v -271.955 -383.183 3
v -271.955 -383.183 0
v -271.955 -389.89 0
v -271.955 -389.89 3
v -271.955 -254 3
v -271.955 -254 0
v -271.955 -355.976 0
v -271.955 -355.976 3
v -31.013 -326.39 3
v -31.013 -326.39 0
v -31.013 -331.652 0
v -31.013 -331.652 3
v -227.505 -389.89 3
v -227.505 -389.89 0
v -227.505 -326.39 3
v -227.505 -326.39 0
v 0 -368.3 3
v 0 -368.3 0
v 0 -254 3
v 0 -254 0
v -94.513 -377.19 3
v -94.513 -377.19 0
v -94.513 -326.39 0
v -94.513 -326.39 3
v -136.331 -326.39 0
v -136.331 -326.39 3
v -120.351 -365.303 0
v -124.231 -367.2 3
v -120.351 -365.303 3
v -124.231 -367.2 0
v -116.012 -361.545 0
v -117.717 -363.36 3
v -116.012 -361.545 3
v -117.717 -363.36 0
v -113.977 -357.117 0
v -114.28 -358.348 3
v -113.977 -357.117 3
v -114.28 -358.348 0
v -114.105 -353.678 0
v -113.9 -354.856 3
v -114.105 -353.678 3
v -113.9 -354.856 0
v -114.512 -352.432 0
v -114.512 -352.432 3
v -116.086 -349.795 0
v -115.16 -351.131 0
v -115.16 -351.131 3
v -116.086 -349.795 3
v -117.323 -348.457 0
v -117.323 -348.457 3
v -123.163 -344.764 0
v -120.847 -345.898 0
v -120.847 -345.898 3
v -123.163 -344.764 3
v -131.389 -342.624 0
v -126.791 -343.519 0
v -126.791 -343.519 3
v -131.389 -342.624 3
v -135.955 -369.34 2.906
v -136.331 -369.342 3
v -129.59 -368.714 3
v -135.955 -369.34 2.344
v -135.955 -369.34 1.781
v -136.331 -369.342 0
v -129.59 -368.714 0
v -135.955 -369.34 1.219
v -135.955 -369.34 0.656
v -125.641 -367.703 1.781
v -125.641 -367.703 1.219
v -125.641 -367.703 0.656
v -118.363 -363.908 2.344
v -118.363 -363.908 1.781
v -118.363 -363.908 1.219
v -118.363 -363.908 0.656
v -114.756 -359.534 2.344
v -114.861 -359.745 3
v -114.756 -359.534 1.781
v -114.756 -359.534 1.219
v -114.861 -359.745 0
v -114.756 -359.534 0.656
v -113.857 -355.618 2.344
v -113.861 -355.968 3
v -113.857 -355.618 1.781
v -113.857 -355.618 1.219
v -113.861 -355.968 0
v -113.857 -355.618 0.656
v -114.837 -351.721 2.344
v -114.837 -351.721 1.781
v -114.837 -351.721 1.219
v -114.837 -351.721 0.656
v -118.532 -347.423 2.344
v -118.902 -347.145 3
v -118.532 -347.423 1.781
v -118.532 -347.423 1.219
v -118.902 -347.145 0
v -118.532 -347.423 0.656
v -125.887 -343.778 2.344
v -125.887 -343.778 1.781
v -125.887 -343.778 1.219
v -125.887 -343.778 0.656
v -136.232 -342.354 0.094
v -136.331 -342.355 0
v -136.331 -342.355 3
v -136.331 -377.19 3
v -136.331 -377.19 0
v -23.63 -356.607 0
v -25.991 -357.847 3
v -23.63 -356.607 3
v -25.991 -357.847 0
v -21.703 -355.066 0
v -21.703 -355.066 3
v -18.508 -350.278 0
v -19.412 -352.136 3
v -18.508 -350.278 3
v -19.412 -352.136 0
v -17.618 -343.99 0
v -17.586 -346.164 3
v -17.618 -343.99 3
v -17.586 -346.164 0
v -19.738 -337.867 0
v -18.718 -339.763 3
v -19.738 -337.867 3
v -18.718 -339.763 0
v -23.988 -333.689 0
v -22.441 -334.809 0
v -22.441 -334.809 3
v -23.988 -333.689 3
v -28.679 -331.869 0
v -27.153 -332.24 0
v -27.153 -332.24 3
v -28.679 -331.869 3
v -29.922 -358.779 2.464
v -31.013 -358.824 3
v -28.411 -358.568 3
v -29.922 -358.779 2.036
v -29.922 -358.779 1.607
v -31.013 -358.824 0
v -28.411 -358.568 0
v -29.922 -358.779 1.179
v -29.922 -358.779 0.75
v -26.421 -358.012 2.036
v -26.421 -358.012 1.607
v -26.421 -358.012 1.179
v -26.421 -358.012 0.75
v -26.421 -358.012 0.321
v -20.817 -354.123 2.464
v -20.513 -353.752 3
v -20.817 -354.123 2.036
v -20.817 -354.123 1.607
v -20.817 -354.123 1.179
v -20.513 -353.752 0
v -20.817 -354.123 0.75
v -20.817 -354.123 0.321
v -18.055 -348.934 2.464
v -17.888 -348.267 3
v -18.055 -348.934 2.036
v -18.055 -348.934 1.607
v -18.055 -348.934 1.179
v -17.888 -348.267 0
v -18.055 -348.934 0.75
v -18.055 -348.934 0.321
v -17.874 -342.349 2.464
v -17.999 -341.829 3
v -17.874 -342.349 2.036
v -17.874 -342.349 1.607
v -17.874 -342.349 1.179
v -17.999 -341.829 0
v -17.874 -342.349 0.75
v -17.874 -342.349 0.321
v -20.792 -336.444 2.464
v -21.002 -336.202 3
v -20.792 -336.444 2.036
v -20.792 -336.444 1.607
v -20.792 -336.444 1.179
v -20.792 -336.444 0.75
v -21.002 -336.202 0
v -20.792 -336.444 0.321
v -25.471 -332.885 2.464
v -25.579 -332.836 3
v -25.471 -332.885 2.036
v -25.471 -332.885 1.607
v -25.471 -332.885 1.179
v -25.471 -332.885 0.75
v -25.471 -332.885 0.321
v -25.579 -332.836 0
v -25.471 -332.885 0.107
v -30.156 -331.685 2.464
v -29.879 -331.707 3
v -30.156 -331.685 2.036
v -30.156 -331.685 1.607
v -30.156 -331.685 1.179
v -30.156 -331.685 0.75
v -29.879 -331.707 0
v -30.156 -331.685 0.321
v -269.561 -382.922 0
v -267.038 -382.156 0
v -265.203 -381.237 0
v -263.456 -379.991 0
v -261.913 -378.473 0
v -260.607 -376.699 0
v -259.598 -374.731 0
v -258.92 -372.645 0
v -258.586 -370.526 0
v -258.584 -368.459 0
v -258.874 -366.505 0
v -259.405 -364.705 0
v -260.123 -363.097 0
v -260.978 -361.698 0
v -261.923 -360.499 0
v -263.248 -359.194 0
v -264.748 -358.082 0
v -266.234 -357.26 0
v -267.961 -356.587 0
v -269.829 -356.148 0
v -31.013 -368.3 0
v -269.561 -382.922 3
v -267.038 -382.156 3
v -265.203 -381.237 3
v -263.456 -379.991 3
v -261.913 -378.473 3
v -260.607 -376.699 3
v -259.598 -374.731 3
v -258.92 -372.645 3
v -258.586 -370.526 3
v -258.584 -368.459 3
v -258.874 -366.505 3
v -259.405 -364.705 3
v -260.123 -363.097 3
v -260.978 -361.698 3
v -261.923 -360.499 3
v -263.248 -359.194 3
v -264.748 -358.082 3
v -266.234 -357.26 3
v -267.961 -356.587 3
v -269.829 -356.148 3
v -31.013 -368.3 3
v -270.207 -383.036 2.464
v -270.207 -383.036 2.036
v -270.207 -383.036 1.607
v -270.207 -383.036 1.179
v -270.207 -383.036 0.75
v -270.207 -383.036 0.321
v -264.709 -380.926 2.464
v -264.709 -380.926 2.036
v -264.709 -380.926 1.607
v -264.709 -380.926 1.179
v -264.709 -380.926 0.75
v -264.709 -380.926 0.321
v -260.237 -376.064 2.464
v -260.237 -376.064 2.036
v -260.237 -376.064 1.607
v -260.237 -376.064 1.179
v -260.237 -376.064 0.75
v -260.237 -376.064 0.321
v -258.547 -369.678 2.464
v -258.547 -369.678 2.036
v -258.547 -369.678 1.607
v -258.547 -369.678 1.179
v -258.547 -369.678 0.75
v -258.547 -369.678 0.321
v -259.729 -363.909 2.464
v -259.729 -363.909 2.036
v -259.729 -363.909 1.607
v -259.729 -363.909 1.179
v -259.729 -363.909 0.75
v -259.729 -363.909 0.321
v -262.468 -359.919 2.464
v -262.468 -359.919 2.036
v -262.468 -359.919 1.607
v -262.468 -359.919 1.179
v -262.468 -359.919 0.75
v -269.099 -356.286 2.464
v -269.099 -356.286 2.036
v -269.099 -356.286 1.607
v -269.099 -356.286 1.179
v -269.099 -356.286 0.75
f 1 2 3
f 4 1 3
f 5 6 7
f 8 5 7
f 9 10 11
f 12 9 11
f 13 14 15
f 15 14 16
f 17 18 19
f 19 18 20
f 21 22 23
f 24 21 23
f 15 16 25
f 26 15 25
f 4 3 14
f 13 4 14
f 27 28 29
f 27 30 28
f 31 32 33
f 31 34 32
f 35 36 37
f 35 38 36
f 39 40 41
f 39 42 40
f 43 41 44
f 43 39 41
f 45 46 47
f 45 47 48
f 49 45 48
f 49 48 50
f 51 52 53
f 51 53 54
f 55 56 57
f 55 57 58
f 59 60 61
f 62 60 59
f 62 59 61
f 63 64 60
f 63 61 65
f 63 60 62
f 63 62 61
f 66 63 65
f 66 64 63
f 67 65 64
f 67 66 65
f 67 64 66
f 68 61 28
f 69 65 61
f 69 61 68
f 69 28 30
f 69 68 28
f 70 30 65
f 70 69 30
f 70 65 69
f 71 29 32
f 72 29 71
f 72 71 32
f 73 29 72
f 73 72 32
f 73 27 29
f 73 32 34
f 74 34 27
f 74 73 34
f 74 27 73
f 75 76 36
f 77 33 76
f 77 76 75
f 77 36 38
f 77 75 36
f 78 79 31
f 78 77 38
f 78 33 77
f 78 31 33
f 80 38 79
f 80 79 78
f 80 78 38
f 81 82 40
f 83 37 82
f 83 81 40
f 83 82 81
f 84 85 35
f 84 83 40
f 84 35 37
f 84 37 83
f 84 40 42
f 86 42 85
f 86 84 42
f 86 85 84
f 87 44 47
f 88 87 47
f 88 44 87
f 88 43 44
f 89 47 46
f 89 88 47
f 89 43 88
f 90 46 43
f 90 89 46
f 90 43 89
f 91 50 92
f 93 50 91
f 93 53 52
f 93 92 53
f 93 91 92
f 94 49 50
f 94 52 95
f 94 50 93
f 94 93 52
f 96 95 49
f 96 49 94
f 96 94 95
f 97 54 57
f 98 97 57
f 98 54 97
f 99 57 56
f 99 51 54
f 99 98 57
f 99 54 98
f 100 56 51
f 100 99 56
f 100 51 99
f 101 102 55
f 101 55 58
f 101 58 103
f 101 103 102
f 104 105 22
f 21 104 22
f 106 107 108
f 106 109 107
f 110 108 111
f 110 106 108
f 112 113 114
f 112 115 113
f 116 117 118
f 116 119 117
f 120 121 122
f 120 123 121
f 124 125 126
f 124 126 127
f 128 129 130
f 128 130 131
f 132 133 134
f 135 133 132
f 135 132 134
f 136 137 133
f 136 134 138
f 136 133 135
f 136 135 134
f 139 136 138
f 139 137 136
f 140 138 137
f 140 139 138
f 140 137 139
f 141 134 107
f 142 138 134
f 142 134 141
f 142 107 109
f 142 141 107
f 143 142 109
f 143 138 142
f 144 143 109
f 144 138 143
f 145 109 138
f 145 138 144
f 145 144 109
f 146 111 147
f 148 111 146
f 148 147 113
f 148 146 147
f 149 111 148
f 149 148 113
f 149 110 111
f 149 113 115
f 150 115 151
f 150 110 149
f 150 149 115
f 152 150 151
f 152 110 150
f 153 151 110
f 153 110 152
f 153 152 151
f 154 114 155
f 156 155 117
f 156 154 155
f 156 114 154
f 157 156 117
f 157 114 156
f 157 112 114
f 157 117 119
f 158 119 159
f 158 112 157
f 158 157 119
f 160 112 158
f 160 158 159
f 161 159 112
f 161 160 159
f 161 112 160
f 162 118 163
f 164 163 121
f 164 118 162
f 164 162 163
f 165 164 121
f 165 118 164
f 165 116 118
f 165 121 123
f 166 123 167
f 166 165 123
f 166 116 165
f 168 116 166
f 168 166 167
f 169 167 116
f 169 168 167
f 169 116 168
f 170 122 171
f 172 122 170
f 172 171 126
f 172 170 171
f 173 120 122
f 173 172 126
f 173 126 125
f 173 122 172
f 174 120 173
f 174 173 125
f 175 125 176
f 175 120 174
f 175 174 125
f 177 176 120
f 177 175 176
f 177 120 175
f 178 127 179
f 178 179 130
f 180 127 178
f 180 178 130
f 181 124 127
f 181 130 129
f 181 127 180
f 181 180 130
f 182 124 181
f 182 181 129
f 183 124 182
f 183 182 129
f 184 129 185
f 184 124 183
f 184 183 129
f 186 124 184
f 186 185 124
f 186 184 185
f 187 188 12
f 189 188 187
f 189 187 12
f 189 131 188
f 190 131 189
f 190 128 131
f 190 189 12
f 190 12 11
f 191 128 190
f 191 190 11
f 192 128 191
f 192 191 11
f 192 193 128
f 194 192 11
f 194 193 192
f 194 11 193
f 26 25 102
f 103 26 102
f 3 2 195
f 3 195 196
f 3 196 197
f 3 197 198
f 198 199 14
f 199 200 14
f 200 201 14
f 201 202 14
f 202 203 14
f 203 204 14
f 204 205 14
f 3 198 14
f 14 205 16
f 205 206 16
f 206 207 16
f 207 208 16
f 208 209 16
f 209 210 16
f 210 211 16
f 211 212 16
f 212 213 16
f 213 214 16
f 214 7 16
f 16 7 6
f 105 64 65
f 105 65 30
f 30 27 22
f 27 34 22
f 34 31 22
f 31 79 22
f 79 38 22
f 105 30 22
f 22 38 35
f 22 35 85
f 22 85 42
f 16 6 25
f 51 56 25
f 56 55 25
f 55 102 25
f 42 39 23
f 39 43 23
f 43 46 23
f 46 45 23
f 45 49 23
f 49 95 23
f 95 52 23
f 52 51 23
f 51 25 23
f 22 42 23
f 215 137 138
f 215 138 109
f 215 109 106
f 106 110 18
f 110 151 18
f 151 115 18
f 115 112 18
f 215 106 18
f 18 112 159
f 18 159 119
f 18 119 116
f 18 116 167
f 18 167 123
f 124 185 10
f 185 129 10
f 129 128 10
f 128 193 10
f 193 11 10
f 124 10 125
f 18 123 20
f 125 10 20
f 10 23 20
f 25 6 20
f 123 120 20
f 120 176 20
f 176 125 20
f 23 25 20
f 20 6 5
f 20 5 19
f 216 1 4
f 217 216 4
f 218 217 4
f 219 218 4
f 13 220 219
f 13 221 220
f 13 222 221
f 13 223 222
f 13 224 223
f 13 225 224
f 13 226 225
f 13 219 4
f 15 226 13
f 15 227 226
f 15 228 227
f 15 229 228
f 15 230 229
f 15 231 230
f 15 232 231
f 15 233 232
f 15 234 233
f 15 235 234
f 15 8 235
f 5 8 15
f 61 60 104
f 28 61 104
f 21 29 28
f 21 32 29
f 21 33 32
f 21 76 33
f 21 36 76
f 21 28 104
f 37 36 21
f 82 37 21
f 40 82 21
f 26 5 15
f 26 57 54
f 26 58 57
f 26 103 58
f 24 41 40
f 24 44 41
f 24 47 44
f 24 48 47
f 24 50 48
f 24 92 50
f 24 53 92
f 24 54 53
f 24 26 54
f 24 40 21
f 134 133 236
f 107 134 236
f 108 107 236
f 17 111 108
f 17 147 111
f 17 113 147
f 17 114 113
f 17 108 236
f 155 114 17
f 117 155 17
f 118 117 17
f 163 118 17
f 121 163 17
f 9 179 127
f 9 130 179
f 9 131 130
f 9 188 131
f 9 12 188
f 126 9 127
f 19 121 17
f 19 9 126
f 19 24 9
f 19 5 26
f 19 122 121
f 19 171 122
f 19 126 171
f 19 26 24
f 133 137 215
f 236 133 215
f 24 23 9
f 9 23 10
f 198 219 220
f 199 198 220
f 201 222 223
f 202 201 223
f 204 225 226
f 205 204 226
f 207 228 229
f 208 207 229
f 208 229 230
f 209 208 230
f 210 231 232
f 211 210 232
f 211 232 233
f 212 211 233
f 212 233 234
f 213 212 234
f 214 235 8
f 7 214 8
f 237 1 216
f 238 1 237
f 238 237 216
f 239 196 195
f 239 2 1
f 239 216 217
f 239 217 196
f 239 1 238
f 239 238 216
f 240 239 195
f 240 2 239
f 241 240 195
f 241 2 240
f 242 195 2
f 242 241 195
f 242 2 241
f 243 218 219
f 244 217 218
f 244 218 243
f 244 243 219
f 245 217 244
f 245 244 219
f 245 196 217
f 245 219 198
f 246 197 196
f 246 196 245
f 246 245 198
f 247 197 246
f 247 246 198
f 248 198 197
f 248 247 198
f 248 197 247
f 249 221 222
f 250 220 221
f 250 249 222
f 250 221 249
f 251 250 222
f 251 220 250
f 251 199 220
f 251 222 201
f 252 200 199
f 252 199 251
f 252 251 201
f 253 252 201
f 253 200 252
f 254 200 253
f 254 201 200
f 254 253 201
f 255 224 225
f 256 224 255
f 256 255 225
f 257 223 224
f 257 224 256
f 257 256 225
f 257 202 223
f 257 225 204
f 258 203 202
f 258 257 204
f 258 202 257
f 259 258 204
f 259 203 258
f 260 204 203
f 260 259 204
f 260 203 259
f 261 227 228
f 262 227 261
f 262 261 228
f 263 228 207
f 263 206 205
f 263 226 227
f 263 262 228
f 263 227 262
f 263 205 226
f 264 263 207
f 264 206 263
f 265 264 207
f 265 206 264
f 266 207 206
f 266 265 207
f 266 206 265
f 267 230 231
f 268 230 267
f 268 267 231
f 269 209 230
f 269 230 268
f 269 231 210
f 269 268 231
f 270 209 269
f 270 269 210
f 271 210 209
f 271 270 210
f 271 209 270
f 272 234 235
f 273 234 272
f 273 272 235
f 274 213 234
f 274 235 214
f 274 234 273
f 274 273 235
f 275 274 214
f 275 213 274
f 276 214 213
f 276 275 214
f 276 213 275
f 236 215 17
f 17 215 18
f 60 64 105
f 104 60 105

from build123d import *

# Parameters (mm, degrees)
BOSS_EXTRUDE3_OUTLINE_W = 330.2
BOSS_EXTRUDE3_OUTLINE_H = 190.5
BOSS_EXTRUDE3_DEPTH     = 3
CUT_EXTRUDE2_DEPTH      = 554.733952504


# Read off the part's stored shape, not the designer's step: Boss-Extrude3
with BuildPart() as part:
    # Boss-Extrude3 outline → Boss-Extrude3 (new body)
    with BuildSketch(Plane.XY):
        with Locations((-165.1, -349.25)):
            Rectangle(BOSS_EXTRUDE3_OUTLINE_W, BOSS_EXTRUDE3_OUTLINE_H)
        with BuildLine():
            add(Edge.make_bspline(
                [(-278.621518652, -381.53819229), (-278.370340025, -381.675788485), (-277.859461829, -381.935426093), (-276.719402462, -382.422402226), (-274.453837446, -383.121197535), (-270.353871795, -383.430649395), (-265.517981506, -381.766237097), (-262.122707267, -378.912933368), (-260.111865445, -376.132298445), (-258.851133292, -372.940751822), (-258.274482706, -368.543399957), (-259.475297643, -363.572067472), (-261.943328375, -360.2835567), (-263.751900196, -358.750531033), (-264.776043253, -358.051952395), (-265.516797717, -357.615831636), (-266.283115012, -357.226375224), (-267.423174378, -356.739399091), (-269.688739395, -356.040603782), (-273.788705045, -355.731151923), (-278.624595335, -357.395564221), (-282.019869573, -360.248867949), (-284.030711396, -363.029502872), (-285.291443548, -366.221049495), (-285.868094135, -370.61840136), (-284.667279197, -375.589733845), (-282.199248466, -378.878244617), (-280.390676644, -380.411270284), (-279.366533588, -381.109848922), (-278.872697278, -381.400596095), (-278.621518652, -381.53819229)],
                knots=[0, 0, 0, 0, 0.015625, 0.03125, 0.0625, 0.125, 0.1875, 0.21875, 0.25, 0.28125, 0.3125, 0.375, 0.4375, 0.46875, 0.484375, 0.5, 0.515625, 0.53125, 0.5625, 0.625, 0.6875, 0.71875, 0.75, 0.78125, 0.8125, 0.875, 0.9375, 0.96875, 0.984375, 1, 1, 1, 1], degree=3))
        make_face(mode=Mode.SUBTRACT)
        with BuildLine():
            add(Edge.make_bspline(
                [(-158.330065967, -356.075599307), (-158.327001416, -356.373395786), (-158.290080957, -356.968671877), (-158.067598918, -358.246608867), (-157.224453748, -360.63292192), (-154.882508758, -363.615638807), (-150.614101822, -366.327010398), (-146.438166973, -368.010630749), (-141.434805852, -369.121724295), (-135.953318408, -369.477027412), (-130.480303716, -369.0089942), (-125.500867751, -367.795170138), (-121.360465048, -366.025968397), (-117.148760273, -363.227330056), (-114.868693567, -360.19704918), (-114.074835681, -357.79389013), (-113.878699845, -356.511645246), (-113.84170646, -355.617780511), (-113.897087149, -354.724866375), (-114.119569188, -353.446929384), (-114.962714357, -351.060616332), (-117.304659348, -348.077899444), (-121.573066284, -345.366527853), (-125.749001132, -343.682907503), (-130.752362254, -342.571813956), (-136.233849698, -342.216510839), (-141.70686439, -342.684544051), (-146.686300354, -343.898368114), (-150.826703058, -345.667569854), (-155.038407833, -348.466208196), (-157.318474538, -351.496489072), (-158.112332425, -353.899648121), (-158.30846826, -355.181893006), (-158.333130517, -355.777802829), (-158.330065967, -356.075599307)],
                knots=[0, 0, 0, 0, 0.015625, 0.03125, 0.0625, 0.125, 0.15625, 0.1875, 0.21875, 0.25, 0.28125, 0.3125, 0.34375, 0.375, 0.4375, 0.46875, 0.484375, 0.5, 0.515625, 0.53125, 0.5625, 0.625, 0.65625, 0.6875, 0.71875, 0.75, 0.78125, 0.8125, 0.84375, 0.875, 0.9375, 0.96875, 0.984375, 1, 1, 1, 1], degree=3))
        make_face(mode=Mode.SUBTRACT)
        with BuildLine():
            add(Edge.make_bspline(
                [(-33.964165547, -331.962198832), (-34.243868077, -332.023492326), (-34.799490244, -332.1633419), (-35.978750805, -332.544818645), (-38.145753578, -333.504844289), (-41.440772349, -335.959441018), (-43.995962688, -340.379536121), (-44.684039348, -344.749082337), (-44.375298942, -348.156558861), (-43.230759499, -351.380879931), (-40.778421797, -355.062241557), (-36.608937685, -358.008703948), (-32.589384281, -358.86039887), (-30.219493581, -358.826218077), (-28.988771838, -358.679575761), (-28.143989915, -358.521589154), (-27.310556664, -358.311814794), (-26.131296103, -357.930338049), (-23.96429333, -356.970312405), (-20.669274558, -354.515715676), (-18.11408422, -350.095620573), (-17.42600756, -345.726074356), (-17.734747965, -342.318597833), (-18.879287408, -339.094276763), (-21.331625111, -335.412915137), (-25.501109223, -332.466452745), (-29.520662627, -331.614757823), (-31.890553327, -331.648938617), (-33.121275069, -331.795580933), (-33.684463018, -331.900905337), (-33.964165547, -331.962198832)],
                knots=[0, 0, 0, 0, 0.015625, 0.03125, 0.0625, 0.125, 0.1875, 0.21875, 0.25, 0.28125, 0.3125, 0.375, 0.4375, 0.46875, 0.484375, 0.5, 0.515625, 0.53125, 0.5625, 0.625, 0.6875, 0.71875, 0.75, 0.78125, 0.8125, 0.875, 0.9375, 0.96875, 0.984375, 1, 1, 1, 1], degree=3))
        make_face(mode=Mode.SUBTRACT)
    extrude(amount=BOSS_EXTRUDE3_DEPTH)

    # Sketch9 → Cut-Extrude2 (cut, through all)
    with BuildSketch(Plane(origin=(0, 0, 0), x_dir=(-1, 0, 0), z_dir=(0, 0, -1))):
        with BuildLine():
            Line((0, -444.5), (330.2, -444.5))
            Line((330.2, -444.5), (330.2, -254))
            Line((330.2, -254), (271.955362236, -254))
            Line((271.955362236, -254), (271.955362236, -355.976421692))
            add(Edge.make_bspline(
                [(271.955362236, -355.976421692), (272.59093246, -355.976421692), (274.983557944, -356.142395301), (278.624595335, -357.395564221), (282.019869573, -360.248867949), (284.030711396, -363.029502872), (285.291443548, -366.221049495), (285.868094135, -370.61840136), (284.667279197, -375.589733845), (282.199248466, -378.878244617), (280.390676644, -380.411270284), (279.366533588, -381.109848922), (278.872697278, -381.400596095), (278.621518652, -381.53819229)],
                knots=[0.601106286, 0.601106286, 0.601106286, 0.601106286, 0.625, 0.6875, 0.71875, 0.75, 0.78125, 0.8125, 0.875, 0.9375, 0.96875, 0.984375, 1, 1, 1, 1], degree=3))
            add(Edge.make_bspline(
                [(278.621518652, -381.53819229), (278.370340025, -381.675788485), (277.859461829, -381.935426093), (276.719402462, -382.422402226), (274.88887928, -382.98701238), (273.070063108, -383.202935147), (271.955362236, -383.183342538)],
                knots=[0, 0, 0, 0, 0.015625, 0.03125, 0.0625, 0.103997424, 0.103997424, 0.103997424, 0.103997424], degree=3))
            Line((271.955362236, -383.183342538), (271.955362236, -389.89))
            Line((271.955362236, -389.89), (227.505362236, -389.89))
            Line((227.505362236, -389.89), (227.505362236, -326.39))
            Line((227.505362236, -326.39), (136.330752091, -326.39))
            Line((136.330752091, -326.39), (136.330752091, -342.354877875))
            add(Edge.make_bspline(
                [(136.330752091, -342.354877875), (138.123654962, -342.378162739), (141.736657922, -342.691806742), (146.686300354, -343.898368114), (150.826703058, -345.667569854), (155.038407833, -348.466208196), (157.318474538, -351.496489072), (158.112332425, -353.899648121), (158.30846826, -355.181893006), (158.333130517, -355.777802829), (158.330065967, -356.075599307)],
                knots=[0.750560936, 0.750560936, 0.750560936, 0.750560936, 0.78125, 0.8125, 0.84375, 0.875, 0.9375, 0.96875, 0.984375, 1, 1, 1, 1], degree=3))
            add(Edge.make_bspline(
                [(158.330065967, -356.075599307), (158.327001416, -356.373395786), (158.290080957, -356.968671877), (158.067598918, -358.246608867), (157.224453748, -360.63292192), (154.882508758, -363.615638807), (150.614101822, -366.327010398), (146.438166973, -368.010630749), (141.549303862, -369.096297788), (138.03098442, -369.341737675), (136.330752091, -369.341737675)],
                knots=[0, 0, 0, 0, 0.015625, 0.03125, 0.0625, 0.125, 0.15625, 0.1875, 0.21875, 0.247854605, 0.247854605, 0.247854605, 0.247854605], degree=3))
            Line((136.330752091, -369.341737675), (136.330752091, -377.19))
            Line((136.330752091, -377.19), (94.512592051, -377.19))
            Line((94.512592051, -377.19), (94.512592051, -326.39))
            Line((94.512592051, -326.39), (31.012592051, -326.39))
            Line((31.012592051, -326.39), (31.012592051, -331.651825694))
            add(Edge.make_bspline(
                [(31.012592051, -331.651825694), (31.419012916, -331.649248653), (32.140901517, -331.678767974), (33.121275069, -331.795580933), (33.684463018, -331.900905337), (33.964165547, -331.962198832)],
                knots=[0.950213485, 0.950213485, 0.950213485, 0.950213485, 0.96875, 0.984375, 1, 1, 1, 1], degree=3))
            add(Edge.make_bspline(
                [(33.964165547, -331.962198832), (34.243868077, -332.023492326), (34.799490244, -332.1633419), (35.978750805, -332.544818645), (38.145753578, -333.504844289), (41.440772349, -335.959441018), (43.995962688, -340.379536121), (44.684039348, -344.749082337), (44.375298942, -348.156558861), (43.230759499, -351.380879931), (40.778421797, -355.062241557), (36.608937685, -358.008703948), (33.032964836, -358.766409497), (31.318148935, -358.823600105), (31.012592051, -358.823600105)],
                knots=[0, 0, 0, 0, 0.015625, 0.03125, 0.0625, 0.125, 0.1875, 0.21875, 0.25, 0.28125, 0.3125, 0.375, 0.4375, 0.451506925, 0.451506925, 0.451506925, 0.451506925], degree=3))
            Line((31.012592051, -358.823600105), (31.012592051, -368.3))
            Line((31.012592051, -368.3), (0, -368.3))
            Line((0, -368.3), (0, -444.5))
        make_face()
    extrude(amount=-CUT_EXTRUDE2_DEPTH, mode=Mode.SUBTRACT)


solid = part.part
